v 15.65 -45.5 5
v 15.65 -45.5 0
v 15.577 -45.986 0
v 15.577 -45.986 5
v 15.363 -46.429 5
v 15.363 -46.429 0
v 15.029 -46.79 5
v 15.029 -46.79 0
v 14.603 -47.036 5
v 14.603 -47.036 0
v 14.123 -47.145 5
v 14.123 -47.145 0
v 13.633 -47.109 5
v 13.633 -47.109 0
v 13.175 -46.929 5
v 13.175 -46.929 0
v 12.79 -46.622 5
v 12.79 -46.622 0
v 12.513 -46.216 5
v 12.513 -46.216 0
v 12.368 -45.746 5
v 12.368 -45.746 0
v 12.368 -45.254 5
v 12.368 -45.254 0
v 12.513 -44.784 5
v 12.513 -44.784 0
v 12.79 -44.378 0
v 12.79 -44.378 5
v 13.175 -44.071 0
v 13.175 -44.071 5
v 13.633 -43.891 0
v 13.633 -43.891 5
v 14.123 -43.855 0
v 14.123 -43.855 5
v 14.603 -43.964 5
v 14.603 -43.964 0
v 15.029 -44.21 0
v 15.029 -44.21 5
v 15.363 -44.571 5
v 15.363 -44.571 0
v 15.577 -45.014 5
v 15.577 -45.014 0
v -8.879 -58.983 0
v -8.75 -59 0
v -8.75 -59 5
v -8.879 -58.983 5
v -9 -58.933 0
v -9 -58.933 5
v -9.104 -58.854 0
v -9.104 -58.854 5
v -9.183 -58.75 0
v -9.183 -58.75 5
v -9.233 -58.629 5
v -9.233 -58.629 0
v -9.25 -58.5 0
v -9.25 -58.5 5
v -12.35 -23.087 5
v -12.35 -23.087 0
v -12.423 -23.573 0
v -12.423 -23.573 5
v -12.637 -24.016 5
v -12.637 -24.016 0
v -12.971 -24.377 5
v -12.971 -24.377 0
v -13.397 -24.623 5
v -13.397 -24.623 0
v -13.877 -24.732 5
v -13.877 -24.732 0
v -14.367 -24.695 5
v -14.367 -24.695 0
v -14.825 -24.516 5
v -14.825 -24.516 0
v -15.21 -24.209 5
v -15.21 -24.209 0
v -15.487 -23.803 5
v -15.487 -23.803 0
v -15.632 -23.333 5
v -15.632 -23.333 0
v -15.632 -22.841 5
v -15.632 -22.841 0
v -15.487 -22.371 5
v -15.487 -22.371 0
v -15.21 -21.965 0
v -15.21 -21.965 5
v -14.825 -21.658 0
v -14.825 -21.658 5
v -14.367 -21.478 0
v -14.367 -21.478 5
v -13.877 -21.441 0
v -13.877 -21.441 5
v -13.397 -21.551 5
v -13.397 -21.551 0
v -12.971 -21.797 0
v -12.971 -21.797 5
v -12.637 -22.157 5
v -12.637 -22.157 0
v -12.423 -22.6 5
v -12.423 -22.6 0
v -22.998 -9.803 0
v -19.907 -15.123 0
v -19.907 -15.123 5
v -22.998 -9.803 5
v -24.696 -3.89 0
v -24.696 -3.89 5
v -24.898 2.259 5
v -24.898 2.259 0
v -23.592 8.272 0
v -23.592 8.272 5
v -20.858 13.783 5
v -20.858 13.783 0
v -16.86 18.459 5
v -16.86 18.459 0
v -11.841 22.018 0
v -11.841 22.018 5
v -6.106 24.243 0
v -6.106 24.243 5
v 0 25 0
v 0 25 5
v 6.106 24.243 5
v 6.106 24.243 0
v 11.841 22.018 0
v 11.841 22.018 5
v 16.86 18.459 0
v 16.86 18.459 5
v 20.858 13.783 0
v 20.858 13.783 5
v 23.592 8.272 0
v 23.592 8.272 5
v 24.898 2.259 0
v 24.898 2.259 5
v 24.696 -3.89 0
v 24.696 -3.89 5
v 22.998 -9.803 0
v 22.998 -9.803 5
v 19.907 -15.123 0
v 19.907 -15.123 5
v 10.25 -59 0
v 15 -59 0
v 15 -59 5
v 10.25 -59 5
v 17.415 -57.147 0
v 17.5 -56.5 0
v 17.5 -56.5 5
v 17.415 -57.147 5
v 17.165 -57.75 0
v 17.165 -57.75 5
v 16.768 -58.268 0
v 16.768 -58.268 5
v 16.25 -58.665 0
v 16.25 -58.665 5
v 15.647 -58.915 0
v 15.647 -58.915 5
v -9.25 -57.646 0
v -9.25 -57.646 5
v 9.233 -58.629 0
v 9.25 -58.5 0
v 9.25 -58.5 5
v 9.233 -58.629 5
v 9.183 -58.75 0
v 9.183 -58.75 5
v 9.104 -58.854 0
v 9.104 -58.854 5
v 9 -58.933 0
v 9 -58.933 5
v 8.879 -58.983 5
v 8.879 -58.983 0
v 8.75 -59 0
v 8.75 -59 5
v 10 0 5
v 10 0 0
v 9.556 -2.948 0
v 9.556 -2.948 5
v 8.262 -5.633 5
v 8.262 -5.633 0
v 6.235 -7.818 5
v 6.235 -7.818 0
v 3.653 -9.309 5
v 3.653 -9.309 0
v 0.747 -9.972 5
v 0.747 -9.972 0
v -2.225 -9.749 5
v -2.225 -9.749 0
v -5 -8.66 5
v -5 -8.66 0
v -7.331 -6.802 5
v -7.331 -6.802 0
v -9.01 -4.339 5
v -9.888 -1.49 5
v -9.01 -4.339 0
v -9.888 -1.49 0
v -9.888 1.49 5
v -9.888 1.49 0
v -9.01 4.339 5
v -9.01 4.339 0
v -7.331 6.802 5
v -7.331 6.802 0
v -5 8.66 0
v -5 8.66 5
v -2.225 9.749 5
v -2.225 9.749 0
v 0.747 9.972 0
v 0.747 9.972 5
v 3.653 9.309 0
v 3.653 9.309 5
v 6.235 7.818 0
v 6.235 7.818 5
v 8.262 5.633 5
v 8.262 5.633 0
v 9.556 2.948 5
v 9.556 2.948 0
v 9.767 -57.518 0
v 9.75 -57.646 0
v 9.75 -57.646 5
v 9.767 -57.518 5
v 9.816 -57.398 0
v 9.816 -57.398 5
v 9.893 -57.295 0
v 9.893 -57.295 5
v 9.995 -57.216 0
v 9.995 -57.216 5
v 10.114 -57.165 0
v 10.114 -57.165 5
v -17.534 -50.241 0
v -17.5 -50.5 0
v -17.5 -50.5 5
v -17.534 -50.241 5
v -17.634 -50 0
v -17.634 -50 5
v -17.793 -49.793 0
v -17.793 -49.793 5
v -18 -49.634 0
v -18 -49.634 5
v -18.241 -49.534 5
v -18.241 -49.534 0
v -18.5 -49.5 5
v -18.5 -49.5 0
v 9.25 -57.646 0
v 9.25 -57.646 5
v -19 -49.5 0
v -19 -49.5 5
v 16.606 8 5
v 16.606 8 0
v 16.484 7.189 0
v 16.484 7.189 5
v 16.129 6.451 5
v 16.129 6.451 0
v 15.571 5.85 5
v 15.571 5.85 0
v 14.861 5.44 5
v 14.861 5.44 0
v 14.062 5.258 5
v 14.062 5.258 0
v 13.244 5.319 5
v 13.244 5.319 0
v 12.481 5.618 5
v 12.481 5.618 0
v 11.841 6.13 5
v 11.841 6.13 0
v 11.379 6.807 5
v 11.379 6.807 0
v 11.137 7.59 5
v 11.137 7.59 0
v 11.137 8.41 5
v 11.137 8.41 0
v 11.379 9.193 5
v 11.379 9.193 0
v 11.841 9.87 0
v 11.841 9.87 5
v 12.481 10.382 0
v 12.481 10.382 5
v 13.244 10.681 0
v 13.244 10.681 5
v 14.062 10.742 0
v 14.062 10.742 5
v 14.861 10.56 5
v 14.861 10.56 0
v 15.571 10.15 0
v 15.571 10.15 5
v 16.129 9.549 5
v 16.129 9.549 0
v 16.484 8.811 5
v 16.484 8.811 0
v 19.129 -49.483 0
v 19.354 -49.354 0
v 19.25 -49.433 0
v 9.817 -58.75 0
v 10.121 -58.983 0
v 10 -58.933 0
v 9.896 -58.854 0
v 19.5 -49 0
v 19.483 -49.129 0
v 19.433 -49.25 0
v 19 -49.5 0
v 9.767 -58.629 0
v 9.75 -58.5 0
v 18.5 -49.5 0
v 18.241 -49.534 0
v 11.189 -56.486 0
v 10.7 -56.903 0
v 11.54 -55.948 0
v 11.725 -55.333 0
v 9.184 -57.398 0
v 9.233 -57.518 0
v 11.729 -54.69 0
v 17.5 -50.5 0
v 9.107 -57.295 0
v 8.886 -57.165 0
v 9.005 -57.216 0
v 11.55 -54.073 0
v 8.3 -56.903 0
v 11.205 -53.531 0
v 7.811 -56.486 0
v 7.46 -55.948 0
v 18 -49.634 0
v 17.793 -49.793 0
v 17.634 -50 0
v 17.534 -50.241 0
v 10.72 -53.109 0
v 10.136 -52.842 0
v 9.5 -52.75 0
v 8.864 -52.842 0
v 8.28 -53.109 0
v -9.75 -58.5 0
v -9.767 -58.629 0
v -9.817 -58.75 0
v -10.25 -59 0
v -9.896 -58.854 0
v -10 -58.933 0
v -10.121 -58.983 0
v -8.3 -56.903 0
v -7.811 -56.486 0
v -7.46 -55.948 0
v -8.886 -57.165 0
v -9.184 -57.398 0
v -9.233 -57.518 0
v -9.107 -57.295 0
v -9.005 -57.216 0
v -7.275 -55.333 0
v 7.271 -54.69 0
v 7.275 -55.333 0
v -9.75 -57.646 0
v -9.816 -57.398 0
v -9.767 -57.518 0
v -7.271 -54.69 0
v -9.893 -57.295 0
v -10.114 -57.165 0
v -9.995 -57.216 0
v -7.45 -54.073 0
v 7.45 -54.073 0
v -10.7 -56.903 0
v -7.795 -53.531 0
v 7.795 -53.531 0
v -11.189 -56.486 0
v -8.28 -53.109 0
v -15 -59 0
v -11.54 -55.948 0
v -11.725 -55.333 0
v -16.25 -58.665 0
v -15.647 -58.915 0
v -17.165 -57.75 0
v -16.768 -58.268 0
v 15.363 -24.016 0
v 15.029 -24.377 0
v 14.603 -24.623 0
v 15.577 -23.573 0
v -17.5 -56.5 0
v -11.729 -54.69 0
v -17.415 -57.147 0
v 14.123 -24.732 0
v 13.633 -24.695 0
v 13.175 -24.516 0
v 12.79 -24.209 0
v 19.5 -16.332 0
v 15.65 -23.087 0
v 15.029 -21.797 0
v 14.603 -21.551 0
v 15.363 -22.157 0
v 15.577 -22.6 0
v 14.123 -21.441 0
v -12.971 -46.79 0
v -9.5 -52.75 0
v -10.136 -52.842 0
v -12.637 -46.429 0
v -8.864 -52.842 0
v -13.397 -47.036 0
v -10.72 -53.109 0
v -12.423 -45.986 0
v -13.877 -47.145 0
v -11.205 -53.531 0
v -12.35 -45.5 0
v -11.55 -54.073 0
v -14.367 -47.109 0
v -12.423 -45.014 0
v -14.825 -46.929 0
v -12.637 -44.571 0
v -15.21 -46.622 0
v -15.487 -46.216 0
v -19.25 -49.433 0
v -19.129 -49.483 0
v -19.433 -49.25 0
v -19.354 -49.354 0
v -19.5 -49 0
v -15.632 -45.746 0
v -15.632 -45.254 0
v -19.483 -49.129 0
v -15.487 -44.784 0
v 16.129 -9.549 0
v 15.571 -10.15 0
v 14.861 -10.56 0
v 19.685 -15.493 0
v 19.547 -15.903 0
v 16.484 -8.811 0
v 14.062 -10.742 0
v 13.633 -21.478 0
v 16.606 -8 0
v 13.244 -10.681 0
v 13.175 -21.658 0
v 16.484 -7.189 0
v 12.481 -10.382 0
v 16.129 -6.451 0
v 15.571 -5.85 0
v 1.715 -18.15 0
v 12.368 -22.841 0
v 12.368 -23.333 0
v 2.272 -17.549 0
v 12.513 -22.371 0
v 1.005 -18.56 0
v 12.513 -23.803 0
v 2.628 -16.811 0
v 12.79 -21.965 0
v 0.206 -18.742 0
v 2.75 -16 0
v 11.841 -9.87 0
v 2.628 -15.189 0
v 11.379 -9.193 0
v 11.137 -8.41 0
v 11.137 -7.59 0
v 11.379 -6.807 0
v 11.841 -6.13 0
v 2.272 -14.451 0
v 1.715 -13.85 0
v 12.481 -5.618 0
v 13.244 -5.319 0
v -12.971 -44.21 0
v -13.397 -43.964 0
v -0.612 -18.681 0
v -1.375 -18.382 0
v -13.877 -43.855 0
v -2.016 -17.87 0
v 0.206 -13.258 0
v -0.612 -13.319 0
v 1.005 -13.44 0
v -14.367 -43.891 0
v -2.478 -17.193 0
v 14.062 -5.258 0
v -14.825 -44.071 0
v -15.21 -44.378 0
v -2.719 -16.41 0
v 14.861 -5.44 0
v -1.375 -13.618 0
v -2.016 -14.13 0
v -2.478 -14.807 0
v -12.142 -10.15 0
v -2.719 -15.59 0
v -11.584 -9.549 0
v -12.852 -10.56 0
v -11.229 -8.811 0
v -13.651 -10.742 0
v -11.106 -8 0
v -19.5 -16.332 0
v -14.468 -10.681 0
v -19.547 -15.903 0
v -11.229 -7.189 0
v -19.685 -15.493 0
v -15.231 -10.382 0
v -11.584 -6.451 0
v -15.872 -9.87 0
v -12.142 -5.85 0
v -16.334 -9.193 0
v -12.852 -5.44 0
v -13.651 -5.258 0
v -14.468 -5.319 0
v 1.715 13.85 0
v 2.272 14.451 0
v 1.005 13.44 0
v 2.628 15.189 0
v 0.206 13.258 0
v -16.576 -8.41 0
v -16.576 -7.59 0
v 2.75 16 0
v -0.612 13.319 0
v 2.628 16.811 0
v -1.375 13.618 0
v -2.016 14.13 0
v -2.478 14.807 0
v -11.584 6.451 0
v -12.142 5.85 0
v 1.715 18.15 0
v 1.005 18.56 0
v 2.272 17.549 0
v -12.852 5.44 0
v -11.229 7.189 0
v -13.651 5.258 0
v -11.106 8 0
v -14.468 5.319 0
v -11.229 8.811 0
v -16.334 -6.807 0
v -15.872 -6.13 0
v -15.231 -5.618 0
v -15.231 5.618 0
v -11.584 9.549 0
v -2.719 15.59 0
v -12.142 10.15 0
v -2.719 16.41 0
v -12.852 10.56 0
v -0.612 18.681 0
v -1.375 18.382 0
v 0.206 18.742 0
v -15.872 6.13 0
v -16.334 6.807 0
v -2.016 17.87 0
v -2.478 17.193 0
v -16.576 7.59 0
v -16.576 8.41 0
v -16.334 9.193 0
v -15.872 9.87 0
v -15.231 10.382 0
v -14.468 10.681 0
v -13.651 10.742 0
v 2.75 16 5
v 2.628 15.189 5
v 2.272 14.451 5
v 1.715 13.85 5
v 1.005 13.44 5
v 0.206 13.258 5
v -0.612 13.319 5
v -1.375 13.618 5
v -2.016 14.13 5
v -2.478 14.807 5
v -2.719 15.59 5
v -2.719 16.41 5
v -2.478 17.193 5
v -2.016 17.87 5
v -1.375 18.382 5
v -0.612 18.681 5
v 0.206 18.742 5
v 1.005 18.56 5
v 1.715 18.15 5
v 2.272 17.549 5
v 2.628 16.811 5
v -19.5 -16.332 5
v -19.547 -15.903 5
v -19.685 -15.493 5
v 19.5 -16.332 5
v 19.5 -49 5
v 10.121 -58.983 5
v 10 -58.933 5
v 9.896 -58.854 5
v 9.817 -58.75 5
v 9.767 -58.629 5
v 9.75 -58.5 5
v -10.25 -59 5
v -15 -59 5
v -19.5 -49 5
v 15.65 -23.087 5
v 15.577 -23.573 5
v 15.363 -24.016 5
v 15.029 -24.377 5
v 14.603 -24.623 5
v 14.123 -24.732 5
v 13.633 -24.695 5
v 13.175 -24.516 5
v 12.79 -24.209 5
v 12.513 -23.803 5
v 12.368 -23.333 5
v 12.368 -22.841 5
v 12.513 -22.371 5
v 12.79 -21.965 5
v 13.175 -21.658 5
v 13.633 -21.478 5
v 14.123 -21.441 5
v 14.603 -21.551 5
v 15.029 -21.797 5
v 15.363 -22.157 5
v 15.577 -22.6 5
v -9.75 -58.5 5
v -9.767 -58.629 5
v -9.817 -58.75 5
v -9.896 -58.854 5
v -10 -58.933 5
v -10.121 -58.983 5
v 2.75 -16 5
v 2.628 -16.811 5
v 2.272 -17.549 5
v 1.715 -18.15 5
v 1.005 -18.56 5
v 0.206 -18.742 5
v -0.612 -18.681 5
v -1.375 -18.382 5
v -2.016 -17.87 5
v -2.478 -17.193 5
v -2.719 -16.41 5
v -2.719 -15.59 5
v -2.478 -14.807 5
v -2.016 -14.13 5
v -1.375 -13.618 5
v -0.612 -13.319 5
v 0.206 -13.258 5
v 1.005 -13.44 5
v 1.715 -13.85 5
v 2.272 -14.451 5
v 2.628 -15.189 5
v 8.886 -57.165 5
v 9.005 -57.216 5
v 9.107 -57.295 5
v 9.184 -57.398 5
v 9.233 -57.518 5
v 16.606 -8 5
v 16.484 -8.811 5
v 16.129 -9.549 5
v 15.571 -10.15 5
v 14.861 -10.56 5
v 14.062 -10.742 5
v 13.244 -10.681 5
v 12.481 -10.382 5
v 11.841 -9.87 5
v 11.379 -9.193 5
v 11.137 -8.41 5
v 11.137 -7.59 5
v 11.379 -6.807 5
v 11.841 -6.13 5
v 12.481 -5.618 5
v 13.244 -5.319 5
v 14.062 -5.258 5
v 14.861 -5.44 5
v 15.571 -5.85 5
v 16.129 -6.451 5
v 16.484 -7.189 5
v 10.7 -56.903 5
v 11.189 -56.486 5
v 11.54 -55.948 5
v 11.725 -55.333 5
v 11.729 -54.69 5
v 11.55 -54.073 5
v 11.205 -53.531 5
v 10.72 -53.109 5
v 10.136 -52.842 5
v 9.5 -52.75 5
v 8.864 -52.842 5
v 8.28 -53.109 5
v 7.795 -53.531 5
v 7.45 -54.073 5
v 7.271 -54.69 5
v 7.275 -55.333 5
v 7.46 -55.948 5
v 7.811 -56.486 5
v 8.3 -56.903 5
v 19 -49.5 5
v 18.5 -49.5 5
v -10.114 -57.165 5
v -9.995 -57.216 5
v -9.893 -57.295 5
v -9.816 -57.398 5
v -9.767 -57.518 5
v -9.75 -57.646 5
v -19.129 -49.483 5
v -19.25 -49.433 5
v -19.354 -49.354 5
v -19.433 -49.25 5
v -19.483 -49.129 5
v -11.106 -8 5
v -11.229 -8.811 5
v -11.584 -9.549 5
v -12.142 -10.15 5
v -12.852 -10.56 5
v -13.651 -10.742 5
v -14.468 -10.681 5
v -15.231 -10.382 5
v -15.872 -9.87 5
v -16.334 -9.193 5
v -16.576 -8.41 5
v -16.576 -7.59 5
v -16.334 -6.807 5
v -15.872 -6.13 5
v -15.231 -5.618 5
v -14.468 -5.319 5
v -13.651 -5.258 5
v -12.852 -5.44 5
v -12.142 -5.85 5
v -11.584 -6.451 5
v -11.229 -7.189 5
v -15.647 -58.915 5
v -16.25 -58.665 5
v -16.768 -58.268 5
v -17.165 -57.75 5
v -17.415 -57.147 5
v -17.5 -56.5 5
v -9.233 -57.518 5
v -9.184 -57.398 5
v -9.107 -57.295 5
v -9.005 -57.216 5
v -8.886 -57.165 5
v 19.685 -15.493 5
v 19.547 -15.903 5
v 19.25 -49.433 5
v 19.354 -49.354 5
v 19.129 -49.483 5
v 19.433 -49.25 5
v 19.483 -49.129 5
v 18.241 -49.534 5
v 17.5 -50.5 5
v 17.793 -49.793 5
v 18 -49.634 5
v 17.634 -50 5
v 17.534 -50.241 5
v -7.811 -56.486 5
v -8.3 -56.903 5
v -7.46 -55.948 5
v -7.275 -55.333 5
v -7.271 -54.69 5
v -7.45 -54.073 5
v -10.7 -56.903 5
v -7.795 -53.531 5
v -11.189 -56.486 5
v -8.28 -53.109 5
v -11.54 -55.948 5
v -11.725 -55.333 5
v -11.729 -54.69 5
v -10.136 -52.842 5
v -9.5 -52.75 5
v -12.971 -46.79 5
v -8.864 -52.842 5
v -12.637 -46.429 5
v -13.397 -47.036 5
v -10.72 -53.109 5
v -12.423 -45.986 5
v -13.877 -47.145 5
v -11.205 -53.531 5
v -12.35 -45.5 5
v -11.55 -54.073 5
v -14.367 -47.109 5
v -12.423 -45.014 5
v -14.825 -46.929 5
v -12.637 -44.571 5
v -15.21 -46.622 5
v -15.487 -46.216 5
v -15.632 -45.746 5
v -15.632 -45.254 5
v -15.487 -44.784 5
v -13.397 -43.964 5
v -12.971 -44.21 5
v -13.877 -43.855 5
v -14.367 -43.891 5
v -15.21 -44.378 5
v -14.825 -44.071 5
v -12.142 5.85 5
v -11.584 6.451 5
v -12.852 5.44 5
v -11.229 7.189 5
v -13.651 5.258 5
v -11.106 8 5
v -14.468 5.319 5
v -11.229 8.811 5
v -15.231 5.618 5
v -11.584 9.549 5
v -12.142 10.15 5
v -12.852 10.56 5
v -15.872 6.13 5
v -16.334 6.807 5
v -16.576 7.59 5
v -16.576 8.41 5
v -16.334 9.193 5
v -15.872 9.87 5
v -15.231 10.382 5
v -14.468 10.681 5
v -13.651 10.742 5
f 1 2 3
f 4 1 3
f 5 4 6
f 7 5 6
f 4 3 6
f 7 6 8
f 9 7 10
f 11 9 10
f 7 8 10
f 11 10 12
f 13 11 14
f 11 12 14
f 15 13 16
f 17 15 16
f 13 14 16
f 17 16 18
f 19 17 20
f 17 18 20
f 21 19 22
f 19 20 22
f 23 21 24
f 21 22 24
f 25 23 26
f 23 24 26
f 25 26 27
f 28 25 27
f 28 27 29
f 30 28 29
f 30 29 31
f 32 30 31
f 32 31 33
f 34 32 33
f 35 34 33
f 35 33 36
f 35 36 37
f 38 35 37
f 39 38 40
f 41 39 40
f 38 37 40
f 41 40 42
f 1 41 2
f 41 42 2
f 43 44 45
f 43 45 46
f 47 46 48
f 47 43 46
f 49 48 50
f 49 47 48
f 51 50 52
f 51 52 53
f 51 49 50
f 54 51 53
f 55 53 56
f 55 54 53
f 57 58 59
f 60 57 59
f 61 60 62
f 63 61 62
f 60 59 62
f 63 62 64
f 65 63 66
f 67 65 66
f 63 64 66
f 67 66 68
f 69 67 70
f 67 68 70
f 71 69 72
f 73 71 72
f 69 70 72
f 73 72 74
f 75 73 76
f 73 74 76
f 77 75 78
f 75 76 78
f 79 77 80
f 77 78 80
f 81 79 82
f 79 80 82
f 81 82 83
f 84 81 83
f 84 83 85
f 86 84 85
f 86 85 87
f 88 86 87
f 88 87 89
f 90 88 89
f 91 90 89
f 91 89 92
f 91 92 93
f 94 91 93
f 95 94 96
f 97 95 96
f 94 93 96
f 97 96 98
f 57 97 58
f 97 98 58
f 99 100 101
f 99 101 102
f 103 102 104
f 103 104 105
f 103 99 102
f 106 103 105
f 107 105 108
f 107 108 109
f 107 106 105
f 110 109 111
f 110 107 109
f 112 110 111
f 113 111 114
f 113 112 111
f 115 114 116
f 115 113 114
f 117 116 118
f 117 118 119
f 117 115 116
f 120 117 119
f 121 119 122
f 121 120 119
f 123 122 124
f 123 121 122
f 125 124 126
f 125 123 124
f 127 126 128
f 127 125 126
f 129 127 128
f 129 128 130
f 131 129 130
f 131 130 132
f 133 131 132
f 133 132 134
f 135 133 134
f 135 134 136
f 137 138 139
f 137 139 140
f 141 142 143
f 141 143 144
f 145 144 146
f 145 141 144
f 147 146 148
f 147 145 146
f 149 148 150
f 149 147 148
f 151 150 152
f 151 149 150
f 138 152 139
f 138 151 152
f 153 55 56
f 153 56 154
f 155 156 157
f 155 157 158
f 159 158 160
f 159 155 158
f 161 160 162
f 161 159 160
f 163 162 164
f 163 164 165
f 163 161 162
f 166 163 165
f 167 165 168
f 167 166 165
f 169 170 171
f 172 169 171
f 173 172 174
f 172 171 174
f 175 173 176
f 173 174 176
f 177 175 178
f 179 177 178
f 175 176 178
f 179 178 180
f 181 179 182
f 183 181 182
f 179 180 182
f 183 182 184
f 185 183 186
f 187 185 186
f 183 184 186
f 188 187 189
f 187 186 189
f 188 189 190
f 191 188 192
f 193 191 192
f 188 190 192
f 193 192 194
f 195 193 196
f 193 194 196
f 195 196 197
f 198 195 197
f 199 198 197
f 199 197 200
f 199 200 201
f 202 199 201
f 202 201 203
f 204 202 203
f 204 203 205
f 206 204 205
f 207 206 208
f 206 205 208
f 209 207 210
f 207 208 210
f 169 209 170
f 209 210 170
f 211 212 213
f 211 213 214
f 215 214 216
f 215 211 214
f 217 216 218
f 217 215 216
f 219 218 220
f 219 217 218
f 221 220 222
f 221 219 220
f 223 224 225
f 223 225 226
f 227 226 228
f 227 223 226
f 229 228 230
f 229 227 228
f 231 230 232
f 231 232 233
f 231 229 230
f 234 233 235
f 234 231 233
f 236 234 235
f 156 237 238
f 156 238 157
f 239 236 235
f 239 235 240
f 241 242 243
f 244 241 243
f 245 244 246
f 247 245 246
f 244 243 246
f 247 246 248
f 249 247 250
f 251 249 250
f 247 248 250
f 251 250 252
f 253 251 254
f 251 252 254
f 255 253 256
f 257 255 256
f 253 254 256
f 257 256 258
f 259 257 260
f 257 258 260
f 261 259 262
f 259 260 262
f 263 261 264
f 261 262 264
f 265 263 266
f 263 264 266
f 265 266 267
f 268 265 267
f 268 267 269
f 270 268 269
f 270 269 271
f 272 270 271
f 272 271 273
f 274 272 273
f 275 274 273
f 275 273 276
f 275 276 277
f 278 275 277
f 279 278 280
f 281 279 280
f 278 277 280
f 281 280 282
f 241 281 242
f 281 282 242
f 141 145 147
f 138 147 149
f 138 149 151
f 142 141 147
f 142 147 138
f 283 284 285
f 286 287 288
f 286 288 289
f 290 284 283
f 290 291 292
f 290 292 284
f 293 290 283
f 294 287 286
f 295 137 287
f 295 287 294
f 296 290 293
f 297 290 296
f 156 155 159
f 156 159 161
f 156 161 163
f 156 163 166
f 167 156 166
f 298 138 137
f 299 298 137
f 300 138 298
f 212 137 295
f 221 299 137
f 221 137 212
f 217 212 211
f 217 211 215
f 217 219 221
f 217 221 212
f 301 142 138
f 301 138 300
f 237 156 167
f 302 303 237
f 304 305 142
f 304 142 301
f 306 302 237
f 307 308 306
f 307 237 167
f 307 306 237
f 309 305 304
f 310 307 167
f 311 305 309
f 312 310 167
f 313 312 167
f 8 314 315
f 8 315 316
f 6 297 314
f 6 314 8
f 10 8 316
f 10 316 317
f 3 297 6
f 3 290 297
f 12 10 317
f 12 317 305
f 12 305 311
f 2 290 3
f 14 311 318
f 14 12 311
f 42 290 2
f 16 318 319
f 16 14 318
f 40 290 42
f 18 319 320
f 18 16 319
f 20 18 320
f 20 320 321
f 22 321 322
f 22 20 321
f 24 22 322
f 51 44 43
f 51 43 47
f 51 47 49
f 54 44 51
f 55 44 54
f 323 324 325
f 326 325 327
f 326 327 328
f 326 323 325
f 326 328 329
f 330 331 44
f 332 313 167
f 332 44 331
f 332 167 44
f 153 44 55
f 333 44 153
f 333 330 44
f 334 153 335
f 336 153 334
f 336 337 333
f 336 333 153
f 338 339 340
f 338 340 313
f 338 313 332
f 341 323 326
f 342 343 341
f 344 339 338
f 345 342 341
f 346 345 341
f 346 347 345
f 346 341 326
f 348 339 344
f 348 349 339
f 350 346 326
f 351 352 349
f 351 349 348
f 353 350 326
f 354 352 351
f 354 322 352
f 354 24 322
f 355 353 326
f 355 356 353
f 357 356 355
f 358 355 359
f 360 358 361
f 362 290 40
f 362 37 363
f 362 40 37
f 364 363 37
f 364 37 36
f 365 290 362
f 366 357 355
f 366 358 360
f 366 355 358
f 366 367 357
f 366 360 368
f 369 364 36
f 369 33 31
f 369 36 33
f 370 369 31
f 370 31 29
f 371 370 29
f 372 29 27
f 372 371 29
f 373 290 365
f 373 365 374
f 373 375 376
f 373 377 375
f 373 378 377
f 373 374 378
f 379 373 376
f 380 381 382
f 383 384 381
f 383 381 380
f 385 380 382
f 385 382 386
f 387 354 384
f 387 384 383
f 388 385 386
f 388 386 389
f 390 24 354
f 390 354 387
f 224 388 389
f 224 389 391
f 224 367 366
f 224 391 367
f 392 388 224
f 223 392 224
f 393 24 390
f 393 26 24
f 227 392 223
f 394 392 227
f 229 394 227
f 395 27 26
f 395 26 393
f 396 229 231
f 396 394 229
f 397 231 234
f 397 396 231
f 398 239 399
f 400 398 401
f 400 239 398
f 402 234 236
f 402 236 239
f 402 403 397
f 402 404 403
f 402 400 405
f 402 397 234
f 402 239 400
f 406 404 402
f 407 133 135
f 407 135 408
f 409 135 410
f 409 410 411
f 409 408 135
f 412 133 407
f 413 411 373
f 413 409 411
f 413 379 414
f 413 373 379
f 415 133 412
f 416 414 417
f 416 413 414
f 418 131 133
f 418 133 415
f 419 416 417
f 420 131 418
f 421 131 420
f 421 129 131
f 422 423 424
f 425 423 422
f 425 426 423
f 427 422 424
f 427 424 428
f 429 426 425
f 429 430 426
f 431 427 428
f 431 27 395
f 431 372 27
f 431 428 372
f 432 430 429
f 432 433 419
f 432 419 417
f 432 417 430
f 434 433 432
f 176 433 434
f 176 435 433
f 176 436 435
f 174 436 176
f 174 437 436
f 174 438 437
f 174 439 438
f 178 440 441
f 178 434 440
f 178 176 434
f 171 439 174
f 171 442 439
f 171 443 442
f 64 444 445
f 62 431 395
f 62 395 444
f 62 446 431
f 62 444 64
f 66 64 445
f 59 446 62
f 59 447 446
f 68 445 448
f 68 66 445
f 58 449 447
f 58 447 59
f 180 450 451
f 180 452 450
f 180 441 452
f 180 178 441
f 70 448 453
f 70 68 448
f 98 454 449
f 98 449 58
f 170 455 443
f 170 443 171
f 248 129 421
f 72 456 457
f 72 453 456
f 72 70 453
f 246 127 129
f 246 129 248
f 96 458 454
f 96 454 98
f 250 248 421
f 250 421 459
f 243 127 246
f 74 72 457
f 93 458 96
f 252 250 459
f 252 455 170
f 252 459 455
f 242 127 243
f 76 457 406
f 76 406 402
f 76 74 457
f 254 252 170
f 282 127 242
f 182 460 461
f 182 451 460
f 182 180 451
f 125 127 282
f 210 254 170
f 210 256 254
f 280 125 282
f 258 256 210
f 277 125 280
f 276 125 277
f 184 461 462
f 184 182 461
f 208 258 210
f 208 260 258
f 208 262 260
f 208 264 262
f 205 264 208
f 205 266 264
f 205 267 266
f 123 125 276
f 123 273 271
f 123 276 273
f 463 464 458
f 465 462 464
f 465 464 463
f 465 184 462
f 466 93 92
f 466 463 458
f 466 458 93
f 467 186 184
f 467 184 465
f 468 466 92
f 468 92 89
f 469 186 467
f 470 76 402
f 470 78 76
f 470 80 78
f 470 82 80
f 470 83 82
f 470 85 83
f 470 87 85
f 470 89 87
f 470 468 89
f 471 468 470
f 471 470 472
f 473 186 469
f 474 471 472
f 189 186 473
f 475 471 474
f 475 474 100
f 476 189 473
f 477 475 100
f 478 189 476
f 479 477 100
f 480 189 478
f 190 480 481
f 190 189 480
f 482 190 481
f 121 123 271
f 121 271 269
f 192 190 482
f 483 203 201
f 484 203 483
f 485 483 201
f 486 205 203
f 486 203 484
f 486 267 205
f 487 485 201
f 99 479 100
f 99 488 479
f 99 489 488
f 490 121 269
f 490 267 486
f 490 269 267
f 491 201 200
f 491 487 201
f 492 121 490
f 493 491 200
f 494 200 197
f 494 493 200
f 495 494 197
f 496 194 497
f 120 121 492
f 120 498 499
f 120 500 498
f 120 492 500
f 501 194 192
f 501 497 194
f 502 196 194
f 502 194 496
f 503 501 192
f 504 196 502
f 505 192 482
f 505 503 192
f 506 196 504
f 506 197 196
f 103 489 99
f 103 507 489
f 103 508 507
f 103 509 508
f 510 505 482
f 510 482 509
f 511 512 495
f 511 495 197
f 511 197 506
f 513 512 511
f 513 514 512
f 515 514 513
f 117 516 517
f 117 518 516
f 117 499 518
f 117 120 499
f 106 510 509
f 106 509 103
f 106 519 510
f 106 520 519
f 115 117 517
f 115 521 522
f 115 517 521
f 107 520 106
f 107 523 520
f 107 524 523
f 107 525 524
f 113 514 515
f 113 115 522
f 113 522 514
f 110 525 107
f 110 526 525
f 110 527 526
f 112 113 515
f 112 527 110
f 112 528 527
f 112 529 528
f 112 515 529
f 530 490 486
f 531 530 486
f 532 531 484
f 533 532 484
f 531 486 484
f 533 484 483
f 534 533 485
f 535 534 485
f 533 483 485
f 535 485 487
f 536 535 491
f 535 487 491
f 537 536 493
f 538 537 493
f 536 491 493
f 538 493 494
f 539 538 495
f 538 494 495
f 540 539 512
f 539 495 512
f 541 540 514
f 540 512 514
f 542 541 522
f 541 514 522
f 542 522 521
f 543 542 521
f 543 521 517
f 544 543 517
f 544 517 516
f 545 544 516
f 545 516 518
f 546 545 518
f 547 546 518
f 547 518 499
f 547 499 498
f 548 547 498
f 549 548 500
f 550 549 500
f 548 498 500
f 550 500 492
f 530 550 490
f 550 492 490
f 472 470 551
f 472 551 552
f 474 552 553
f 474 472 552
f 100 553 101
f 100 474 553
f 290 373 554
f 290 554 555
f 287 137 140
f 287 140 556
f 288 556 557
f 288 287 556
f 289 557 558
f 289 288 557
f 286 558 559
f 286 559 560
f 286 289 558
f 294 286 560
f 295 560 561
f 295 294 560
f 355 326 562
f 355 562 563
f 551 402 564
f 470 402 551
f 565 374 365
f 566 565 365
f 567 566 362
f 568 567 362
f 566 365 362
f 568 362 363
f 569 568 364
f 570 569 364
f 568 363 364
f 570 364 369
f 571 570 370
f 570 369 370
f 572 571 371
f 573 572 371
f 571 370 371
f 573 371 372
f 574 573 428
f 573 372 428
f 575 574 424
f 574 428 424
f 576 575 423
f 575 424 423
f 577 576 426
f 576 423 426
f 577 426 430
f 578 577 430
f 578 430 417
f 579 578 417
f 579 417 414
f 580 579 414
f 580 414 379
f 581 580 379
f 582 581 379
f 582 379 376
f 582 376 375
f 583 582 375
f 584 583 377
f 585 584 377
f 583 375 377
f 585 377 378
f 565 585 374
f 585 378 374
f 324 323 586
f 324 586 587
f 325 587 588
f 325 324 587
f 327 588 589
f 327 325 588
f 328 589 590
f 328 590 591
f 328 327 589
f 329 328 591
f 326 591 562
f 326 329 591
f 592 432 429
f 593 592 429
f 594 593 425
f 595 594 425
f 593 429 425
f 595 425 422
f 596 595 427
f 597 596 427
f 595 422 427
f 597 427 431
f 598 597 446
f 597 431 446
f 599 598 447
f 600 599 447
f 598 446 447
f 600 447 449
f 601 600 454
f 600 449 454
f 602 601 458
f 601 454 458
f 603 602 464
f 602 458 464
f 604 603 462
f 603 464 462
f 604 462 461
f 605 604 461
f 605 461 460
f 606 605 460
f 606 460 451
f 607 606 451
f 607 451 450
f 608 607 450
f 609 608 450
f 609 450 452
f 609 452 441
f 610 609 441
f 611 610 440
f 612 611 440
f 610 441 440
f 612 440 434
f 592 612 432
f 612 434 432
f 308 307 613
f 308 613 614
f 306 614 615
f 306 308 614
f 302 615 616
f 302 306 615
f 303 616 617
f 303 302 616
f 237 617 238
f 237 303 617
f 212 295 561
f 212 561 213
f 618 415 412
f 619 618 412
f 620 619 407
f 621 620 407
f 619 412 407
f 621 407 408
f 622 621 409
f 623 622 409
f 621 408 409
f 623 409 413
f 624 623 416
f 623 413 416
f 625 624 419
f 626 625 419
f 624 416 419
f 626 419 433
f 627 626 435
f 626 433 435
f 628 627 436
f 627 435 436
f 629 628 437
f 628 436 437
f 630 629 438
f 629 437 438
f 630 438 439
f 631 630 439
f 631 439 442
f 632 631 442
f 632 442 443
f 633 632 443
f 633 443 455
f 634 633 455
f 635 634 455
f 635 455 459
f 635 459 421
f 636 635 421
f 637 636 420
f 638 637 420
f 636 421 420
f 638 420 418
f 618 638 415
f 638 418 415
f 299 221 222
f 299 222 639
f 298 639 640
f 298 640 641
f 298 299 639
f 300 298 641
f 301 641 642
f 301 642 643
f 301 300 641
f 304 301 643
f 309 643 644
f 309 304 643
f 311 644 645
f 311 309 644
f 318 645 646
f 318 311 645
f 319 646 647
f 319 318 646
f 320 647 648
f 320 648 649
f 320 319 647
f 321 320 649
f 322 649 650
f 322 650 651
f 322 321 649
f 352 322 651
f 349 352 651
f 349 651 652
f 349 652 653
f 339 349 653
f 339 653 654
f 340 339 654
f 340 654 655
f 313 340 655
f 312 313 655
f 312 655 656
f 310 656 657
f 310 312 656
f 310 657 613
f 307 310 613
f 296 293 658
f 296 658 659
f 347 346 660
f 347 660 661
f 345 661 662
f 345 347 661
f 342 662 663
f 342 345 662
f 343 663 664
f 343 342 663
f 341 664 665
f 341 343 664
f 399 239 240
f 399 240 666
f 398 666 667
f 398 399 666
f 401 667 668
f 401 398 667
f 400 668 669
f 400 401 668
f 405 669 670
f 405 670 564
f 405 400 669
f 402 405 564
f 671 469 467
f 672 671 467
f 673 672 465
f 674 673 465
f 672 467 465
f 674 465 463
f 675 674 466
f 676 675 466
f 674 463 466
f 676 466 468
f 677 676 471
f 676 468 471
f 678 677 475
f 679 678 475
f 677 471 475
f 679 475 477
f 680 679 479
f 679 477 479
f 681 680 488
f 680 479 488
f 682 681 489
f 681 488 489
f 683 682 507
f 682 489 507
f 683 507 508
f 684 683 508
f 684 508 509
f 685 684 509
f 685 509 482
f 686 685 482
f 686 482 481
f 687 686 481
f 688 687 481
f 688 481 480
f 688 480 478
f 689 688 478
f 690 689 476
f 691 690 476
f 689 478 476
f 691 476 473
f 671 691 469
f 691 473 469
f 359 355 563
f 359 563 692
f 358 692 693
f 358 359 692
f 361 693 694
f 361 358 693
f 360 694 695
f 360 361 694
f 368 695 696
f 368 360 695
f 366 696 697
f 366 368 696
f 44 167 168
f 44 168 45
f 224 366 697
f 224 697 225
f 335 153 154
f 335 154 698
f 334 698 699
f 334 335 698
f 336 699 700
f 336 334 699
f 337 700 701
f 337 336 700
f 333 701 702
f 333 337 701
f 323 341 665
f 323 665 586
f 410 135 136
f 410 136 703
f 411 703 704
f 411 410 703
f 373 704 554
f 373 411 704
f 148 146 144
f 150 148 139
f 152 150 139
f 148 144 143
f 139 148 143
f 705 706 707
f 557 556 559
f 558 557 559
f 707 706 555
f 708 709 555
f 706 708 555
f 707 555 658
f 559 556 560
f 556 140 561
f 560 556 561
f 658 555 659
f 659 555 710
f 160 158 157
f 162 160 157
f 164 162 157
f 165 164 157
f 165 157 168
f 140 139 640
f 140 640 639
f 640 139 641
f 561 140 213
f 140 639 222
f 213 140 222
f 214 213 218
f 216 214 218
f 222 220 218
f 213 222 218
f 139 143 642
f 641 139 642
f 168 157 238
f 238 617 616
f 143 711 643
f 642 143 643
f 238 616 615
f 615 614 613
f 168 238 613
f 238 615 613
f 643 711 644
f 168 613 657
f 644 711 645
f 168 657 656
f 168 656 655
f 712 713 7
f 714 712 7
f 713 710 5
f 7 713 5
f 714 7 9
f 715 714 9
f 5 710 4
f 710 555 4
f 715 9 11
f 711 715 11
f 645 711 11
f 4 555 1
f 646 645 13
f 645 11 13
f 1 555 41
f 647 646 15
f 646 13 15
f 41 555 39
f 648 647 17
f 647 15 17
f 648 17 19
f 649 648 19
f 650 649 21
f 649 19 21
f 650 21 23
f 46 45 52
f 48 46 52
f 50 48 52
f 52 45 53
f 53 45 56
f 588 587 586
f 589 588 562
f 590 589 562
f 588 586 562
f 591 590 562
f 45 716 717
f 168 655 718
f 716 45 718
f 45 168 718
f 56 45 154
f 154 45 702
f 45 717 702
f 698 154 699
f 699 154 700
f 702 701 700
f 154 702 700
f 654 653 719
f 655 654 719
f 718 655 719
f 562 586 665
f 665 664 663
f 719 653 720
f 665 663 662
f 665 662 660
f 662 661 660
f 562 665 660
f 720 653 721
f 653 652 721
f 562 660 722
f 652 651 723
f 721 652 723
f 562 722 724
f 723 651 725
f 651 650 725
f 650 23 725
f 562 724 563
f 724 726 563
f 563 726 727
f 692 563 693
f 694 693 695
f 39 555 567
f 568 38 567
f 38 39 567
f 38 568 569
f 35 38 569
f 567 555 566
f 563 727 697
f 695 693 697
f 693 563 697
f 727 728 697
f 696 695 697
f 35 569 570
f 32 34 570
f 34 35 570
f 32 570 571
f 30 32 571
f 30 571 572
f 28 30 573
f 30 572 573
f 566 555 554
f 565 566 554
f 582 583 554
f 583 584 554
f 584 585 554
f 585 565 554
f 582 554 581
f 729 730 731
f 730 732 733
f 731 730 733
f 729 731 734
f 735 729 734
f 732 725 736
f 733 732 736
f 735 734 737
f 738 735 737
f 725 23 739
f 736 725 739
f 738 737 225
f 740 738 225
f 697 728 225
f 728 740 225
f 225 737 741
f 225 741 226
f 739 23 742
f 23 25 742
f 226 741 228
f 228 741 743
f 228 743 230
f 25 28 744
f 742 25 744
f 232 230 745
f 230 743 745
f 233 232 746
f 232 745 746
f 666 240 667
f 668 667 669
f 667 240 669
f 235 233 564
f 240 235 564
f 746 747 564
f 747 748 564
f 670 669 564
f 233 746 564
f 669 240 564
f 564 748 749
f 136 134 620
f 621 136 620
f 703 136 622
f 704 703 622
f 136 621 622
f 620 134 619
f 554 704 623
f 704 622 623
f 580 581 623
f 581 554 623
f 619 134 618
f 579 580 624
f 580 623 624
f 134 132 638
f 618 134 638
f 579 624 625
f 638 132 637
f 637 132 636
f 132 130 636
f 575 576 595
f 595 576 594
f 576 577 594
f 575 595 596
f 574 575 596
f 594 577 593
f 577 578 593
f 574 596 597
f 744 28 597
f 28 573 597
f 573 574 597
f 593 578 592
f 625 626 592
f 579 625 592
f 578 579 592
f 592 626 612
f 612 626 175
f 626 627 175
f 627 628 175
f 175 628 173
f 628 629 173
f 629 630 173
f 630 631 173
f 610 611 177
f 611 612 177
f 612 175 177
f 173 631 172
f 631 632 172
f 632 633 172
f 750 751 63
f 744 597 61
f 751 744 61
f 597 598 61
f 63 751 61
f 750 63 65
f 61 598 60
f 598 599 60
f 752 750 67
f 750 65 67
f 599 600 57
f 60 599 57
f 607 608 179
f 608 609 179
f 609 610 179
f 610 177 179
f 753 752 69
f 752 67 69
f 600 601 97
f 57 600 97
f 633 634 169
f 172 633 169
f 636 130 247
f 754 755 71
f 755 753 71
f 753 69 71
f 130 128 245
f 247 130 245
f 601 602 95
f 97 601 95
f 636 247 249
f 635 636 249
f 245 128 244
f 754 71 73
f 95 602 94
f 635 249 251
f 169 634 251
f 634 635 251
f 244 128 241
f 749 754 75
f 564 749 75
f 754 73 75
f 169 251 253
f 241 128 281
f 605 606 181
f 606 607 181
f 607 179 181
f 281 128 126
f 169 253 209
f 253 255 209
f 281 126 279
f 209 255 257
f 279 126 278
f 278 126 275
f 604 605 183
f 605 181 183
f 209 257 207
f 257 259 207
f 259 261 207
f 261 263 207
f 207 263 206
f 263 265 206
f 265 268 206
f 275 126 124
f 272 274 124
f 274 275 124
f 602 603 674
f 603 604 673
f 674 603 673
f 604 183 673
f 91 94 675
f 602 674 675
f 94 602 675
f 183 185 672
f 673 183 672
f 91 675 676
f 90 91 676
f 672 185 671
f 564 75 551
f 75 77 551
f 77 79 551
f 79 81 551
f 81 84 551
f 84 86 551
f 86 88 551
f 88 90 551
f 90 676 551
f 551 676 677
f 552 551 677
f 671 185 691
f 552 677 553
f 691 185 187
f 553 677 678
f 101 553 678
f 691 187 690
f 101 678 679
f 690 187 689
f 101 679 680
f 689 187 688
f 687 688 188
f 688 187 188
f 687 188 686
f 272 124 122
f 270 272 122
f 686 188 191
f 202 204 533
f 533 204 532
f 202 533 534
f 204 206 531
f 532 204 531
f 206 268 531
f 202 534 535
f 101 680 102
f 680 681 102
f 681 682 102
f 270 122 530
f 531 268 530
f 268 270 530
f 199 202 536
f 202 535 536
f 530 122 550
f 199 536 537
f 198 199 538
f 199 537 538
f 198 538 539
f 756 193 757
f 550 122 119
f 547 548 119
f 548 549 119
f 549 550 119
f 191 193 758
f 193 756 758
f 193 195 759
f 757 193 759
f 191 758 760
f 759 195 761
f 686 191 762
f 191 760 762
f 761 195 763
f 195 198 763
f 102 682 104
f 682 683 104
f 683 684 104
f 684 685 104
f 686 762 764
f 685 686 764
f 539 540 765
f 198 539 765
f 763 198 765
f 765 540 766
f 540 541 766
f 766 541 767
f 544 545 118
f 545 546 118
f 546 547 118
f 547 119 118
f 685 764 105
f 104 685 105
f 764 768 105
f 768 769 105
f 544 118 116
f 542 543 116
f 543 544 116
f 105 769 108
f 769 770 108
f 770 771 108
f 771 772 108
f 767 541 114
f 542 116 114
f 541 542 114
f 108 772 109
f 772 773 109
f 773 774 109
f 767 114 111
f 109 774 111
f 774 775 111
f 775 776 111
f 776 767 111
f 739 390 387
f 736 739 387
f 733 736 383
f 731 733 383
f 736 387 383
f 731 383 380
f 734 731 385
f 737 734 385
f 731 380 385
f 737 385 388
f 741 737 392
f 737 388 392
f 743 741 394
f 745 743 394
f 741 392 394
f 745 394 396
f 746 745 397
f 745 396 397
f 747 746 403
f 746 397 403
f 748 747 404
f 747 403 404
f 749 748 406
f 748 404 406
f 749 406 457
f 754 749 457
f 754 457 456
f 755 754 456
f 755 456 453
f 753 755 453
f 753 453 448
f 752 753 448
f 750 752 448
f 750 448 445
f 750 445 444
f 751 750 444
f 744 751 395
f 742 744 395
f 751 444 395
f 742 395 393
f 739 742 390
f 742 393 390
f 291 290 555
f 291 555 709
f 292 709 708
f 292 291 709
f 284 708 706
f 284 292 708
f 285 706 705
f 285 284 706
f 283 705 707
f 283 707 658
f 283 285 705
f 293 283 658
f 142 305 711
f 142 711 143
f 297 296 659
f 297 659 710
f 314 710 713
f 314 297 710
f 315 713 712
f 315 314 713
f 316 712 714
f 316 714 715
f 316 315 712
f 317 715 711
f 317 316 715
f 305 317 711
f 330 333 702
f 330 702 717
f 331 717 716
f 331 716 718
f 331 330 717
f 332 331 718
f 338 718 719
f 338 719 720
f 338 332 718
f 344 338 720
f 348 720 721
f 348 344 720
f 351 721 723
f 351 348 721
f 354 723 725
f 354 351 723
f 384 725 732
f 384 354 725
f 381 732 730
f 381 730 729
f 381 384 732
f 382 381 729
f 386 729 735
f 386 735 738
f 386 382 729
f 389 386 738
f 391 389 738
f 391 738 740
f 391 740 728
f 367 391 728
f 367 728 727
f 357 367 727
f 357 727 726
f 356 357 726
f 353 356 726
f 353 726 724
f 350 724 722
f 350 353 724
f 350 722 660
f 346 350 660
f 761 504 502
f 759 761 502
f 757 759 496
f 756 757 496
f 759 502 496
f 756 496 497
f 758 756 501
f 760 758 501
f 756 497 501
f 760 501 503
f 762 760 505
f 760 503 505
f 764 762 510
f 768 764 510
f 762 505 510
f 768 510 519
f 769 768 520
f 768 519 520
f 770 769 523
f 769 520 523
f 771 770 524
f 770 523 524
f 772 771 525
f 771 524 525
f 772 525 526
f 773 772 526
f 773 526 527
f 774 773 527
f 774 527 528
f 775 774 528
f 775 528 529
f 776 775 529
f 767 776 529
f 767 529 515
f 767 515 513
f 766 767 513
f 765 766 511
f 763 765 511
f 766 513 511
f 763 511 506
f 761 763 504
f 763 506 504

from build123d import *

# Parameters (mm, degrees)
SKETCH_1_R      = 10
SKETCH_1_R_2    = 2.75
SKETCH_1_R_3    = 1.65
EXTRUDE_1_DEPTH = 5


with BuildPart() as part:
    # 草图1 → 凸台-拉伸1 (new body)
    with BuildSketch(Plane(origin=(0, 0, 0), x_dir=(-1, 0, 0), z_dir=(0, 0, -1))):
        with BuildLine():
            Line((-15, -59), (-10.25, -59))
            ThreePointArc((-10.25, -59), (-9.896446609, -58.853553391), (-9.75, -58.5))
            Line((-9.75, -58.5), (-9.75, -57.645751311))
            ThreePointArc((-9.75, -57.645751311), (-9.851137982, -57.344239966), (-10.113636364, -57.164705618))
            ThreePointArc((-10.113636364, -57.164705618), (-9.5, -52.75), (-8.886363636, -57.164705618))
            ThreePointArc((-8.886363636, -57.164705618), (-9.148862018, -57.344239966), (-9.25, -57.645751311))
            Line((-9.25, -57.645751311), (-9.25, -58.5))
            ThreePointArc((-9.25, -58.5), (-9.103553391, -58.853553391), (-8.75, -59))
            Line((-8.75, -59), (8.75, -59))
            ThreePointArc((8.75, -59), (9.103553391, -58.853553391), (9.25, -58.5))
            Line((9.25, -58.5), (9.25, -57.645751311))
            ThreePointArc((9.25, -57.645751311), (9.148862018, -57.344239966), (8.886363636, -57.164705618))
            ThreePointArc((8.886363636, -57.164705618), (9.5, -52.75), (10.113636364, -57.164705618))
            ThreePointArc((10.113636364, -57.164705618), (9.851137982, -57.344239966), (9.75, -57.645751311))
            Line((9.75, -57.645751311), (9.75, -58.5))
            ThreePointArc((9.75, -58.5), (9.896446609, -58.853553391), (10.25, -59))
            Line((10.25, -59), (15, -59))
            ThreePointArc((15, -59), (16.767766953, -58.267766953), (17.5, -56.5))
            Line((17.5, -56.5), (17.5, -50.5))
            ThreePointArc((17.5, -50.5), (17.792893219, -49.792893219), (18.5, -49.5))
            Line((18.5, -49.5), (19, -49.5))
            ThreePointArc((19, -49.5), (19.353553391, -49.353553391), (19.5, -49))
            Line((19.5, -49), (19.5, -16.332482971))
            ThreePointArc((19.5, -16.332482971), (19.604586432, -15.694198233), (19.907407407, -15.122669418))
            ThreePointArc((19.907407407, -15.122669418), (0, 25), (-19.907407407, -15.122669418))
            ThreePointArc((-19.907407407, -15.122669418), (-19.604586432, -15.694198233), (-19.5, -16.332482971))
            Line((-19.5, -16.332482971), (-19.5, -49))
            ThreePointArc((-19.5, -49), (-19.353553391, -49.353553391), (-19, -49.5))
            Line((-19, -49.5), (-18.5, -49.5))
            ThreePointArc((-18.5, -49.5), (-17.792893219, -49.792893219), (-17.5, -50.5))
            Line((-17.5, -50.5), (-17.5, -56.5))
            ThreePointArc((-17.5, -56.5), (-16.767766953, -58.267766953), (-15, -59))
        make_face()
        with Locations(Location((0, 0, 0), (0, 0, 180))):
            Circle(SKETCH_1_R, mode=Mode.SUBTRACT)
        with Locations(Location((13.856406461, 8, 0), (0, 0, 180))):
            Circle(SKETCH_1_R_2, mode=Mode.SUBTRACT)
        with Locations(Location((13.856406461, -8, 0), (0, 0, 180))):
            Circle(SKETCH_1_R_2, mode=Mode.SUBTRACT)
        with Locations(Location((0, -16, 0), (0, 0, 180))):
            Circle(SKETCH_1_R_2, mode=Mode.SUBTRACT)
        with Locations(Location((-13.856406461, -8, 0), (0, 0, 180))):
            Circle(SKETCH_1_R_2, mode=Mode.SUBTRACT)
        with Locations(Location((-13.856406461, 8, 0), (0, 0, 180))):
            Circle(SKETCH_1_R_2, mode=Mode.SUBTRACT)
        with Locations(Location((0, 16, 0), (0, 0, 180))):
            Circle(SKETCH_1_R_2, mode=Mode.SUBTRACT)
        with Locations(Location((14, -23.086792761, 0), (0, 0, 180))):
            Circle(SKETCH_1_R_3, mode=Mode.SUBTRACT)
        with Locations(Location((-14, -23.086792761, 0), (0, 0, 180))):
            Circle(SKETCH_1_R_3, mode=Mode.SUBTRACT)
        with Locations(Location((-14, -45.5, 0), (0, 0, 180))):
            Circle(SKETCH_1_R_3, mode=Mode.SUBTRACT)
        with Locations(Location((14, -45.5, 0), (0, 0, 180))):
            Circle(SKETCH_1_R_3, mode=Mode.SUBTRACT)
    extrude(amount=-EXTRUDE_1_DEPTH)


solid = part.part
